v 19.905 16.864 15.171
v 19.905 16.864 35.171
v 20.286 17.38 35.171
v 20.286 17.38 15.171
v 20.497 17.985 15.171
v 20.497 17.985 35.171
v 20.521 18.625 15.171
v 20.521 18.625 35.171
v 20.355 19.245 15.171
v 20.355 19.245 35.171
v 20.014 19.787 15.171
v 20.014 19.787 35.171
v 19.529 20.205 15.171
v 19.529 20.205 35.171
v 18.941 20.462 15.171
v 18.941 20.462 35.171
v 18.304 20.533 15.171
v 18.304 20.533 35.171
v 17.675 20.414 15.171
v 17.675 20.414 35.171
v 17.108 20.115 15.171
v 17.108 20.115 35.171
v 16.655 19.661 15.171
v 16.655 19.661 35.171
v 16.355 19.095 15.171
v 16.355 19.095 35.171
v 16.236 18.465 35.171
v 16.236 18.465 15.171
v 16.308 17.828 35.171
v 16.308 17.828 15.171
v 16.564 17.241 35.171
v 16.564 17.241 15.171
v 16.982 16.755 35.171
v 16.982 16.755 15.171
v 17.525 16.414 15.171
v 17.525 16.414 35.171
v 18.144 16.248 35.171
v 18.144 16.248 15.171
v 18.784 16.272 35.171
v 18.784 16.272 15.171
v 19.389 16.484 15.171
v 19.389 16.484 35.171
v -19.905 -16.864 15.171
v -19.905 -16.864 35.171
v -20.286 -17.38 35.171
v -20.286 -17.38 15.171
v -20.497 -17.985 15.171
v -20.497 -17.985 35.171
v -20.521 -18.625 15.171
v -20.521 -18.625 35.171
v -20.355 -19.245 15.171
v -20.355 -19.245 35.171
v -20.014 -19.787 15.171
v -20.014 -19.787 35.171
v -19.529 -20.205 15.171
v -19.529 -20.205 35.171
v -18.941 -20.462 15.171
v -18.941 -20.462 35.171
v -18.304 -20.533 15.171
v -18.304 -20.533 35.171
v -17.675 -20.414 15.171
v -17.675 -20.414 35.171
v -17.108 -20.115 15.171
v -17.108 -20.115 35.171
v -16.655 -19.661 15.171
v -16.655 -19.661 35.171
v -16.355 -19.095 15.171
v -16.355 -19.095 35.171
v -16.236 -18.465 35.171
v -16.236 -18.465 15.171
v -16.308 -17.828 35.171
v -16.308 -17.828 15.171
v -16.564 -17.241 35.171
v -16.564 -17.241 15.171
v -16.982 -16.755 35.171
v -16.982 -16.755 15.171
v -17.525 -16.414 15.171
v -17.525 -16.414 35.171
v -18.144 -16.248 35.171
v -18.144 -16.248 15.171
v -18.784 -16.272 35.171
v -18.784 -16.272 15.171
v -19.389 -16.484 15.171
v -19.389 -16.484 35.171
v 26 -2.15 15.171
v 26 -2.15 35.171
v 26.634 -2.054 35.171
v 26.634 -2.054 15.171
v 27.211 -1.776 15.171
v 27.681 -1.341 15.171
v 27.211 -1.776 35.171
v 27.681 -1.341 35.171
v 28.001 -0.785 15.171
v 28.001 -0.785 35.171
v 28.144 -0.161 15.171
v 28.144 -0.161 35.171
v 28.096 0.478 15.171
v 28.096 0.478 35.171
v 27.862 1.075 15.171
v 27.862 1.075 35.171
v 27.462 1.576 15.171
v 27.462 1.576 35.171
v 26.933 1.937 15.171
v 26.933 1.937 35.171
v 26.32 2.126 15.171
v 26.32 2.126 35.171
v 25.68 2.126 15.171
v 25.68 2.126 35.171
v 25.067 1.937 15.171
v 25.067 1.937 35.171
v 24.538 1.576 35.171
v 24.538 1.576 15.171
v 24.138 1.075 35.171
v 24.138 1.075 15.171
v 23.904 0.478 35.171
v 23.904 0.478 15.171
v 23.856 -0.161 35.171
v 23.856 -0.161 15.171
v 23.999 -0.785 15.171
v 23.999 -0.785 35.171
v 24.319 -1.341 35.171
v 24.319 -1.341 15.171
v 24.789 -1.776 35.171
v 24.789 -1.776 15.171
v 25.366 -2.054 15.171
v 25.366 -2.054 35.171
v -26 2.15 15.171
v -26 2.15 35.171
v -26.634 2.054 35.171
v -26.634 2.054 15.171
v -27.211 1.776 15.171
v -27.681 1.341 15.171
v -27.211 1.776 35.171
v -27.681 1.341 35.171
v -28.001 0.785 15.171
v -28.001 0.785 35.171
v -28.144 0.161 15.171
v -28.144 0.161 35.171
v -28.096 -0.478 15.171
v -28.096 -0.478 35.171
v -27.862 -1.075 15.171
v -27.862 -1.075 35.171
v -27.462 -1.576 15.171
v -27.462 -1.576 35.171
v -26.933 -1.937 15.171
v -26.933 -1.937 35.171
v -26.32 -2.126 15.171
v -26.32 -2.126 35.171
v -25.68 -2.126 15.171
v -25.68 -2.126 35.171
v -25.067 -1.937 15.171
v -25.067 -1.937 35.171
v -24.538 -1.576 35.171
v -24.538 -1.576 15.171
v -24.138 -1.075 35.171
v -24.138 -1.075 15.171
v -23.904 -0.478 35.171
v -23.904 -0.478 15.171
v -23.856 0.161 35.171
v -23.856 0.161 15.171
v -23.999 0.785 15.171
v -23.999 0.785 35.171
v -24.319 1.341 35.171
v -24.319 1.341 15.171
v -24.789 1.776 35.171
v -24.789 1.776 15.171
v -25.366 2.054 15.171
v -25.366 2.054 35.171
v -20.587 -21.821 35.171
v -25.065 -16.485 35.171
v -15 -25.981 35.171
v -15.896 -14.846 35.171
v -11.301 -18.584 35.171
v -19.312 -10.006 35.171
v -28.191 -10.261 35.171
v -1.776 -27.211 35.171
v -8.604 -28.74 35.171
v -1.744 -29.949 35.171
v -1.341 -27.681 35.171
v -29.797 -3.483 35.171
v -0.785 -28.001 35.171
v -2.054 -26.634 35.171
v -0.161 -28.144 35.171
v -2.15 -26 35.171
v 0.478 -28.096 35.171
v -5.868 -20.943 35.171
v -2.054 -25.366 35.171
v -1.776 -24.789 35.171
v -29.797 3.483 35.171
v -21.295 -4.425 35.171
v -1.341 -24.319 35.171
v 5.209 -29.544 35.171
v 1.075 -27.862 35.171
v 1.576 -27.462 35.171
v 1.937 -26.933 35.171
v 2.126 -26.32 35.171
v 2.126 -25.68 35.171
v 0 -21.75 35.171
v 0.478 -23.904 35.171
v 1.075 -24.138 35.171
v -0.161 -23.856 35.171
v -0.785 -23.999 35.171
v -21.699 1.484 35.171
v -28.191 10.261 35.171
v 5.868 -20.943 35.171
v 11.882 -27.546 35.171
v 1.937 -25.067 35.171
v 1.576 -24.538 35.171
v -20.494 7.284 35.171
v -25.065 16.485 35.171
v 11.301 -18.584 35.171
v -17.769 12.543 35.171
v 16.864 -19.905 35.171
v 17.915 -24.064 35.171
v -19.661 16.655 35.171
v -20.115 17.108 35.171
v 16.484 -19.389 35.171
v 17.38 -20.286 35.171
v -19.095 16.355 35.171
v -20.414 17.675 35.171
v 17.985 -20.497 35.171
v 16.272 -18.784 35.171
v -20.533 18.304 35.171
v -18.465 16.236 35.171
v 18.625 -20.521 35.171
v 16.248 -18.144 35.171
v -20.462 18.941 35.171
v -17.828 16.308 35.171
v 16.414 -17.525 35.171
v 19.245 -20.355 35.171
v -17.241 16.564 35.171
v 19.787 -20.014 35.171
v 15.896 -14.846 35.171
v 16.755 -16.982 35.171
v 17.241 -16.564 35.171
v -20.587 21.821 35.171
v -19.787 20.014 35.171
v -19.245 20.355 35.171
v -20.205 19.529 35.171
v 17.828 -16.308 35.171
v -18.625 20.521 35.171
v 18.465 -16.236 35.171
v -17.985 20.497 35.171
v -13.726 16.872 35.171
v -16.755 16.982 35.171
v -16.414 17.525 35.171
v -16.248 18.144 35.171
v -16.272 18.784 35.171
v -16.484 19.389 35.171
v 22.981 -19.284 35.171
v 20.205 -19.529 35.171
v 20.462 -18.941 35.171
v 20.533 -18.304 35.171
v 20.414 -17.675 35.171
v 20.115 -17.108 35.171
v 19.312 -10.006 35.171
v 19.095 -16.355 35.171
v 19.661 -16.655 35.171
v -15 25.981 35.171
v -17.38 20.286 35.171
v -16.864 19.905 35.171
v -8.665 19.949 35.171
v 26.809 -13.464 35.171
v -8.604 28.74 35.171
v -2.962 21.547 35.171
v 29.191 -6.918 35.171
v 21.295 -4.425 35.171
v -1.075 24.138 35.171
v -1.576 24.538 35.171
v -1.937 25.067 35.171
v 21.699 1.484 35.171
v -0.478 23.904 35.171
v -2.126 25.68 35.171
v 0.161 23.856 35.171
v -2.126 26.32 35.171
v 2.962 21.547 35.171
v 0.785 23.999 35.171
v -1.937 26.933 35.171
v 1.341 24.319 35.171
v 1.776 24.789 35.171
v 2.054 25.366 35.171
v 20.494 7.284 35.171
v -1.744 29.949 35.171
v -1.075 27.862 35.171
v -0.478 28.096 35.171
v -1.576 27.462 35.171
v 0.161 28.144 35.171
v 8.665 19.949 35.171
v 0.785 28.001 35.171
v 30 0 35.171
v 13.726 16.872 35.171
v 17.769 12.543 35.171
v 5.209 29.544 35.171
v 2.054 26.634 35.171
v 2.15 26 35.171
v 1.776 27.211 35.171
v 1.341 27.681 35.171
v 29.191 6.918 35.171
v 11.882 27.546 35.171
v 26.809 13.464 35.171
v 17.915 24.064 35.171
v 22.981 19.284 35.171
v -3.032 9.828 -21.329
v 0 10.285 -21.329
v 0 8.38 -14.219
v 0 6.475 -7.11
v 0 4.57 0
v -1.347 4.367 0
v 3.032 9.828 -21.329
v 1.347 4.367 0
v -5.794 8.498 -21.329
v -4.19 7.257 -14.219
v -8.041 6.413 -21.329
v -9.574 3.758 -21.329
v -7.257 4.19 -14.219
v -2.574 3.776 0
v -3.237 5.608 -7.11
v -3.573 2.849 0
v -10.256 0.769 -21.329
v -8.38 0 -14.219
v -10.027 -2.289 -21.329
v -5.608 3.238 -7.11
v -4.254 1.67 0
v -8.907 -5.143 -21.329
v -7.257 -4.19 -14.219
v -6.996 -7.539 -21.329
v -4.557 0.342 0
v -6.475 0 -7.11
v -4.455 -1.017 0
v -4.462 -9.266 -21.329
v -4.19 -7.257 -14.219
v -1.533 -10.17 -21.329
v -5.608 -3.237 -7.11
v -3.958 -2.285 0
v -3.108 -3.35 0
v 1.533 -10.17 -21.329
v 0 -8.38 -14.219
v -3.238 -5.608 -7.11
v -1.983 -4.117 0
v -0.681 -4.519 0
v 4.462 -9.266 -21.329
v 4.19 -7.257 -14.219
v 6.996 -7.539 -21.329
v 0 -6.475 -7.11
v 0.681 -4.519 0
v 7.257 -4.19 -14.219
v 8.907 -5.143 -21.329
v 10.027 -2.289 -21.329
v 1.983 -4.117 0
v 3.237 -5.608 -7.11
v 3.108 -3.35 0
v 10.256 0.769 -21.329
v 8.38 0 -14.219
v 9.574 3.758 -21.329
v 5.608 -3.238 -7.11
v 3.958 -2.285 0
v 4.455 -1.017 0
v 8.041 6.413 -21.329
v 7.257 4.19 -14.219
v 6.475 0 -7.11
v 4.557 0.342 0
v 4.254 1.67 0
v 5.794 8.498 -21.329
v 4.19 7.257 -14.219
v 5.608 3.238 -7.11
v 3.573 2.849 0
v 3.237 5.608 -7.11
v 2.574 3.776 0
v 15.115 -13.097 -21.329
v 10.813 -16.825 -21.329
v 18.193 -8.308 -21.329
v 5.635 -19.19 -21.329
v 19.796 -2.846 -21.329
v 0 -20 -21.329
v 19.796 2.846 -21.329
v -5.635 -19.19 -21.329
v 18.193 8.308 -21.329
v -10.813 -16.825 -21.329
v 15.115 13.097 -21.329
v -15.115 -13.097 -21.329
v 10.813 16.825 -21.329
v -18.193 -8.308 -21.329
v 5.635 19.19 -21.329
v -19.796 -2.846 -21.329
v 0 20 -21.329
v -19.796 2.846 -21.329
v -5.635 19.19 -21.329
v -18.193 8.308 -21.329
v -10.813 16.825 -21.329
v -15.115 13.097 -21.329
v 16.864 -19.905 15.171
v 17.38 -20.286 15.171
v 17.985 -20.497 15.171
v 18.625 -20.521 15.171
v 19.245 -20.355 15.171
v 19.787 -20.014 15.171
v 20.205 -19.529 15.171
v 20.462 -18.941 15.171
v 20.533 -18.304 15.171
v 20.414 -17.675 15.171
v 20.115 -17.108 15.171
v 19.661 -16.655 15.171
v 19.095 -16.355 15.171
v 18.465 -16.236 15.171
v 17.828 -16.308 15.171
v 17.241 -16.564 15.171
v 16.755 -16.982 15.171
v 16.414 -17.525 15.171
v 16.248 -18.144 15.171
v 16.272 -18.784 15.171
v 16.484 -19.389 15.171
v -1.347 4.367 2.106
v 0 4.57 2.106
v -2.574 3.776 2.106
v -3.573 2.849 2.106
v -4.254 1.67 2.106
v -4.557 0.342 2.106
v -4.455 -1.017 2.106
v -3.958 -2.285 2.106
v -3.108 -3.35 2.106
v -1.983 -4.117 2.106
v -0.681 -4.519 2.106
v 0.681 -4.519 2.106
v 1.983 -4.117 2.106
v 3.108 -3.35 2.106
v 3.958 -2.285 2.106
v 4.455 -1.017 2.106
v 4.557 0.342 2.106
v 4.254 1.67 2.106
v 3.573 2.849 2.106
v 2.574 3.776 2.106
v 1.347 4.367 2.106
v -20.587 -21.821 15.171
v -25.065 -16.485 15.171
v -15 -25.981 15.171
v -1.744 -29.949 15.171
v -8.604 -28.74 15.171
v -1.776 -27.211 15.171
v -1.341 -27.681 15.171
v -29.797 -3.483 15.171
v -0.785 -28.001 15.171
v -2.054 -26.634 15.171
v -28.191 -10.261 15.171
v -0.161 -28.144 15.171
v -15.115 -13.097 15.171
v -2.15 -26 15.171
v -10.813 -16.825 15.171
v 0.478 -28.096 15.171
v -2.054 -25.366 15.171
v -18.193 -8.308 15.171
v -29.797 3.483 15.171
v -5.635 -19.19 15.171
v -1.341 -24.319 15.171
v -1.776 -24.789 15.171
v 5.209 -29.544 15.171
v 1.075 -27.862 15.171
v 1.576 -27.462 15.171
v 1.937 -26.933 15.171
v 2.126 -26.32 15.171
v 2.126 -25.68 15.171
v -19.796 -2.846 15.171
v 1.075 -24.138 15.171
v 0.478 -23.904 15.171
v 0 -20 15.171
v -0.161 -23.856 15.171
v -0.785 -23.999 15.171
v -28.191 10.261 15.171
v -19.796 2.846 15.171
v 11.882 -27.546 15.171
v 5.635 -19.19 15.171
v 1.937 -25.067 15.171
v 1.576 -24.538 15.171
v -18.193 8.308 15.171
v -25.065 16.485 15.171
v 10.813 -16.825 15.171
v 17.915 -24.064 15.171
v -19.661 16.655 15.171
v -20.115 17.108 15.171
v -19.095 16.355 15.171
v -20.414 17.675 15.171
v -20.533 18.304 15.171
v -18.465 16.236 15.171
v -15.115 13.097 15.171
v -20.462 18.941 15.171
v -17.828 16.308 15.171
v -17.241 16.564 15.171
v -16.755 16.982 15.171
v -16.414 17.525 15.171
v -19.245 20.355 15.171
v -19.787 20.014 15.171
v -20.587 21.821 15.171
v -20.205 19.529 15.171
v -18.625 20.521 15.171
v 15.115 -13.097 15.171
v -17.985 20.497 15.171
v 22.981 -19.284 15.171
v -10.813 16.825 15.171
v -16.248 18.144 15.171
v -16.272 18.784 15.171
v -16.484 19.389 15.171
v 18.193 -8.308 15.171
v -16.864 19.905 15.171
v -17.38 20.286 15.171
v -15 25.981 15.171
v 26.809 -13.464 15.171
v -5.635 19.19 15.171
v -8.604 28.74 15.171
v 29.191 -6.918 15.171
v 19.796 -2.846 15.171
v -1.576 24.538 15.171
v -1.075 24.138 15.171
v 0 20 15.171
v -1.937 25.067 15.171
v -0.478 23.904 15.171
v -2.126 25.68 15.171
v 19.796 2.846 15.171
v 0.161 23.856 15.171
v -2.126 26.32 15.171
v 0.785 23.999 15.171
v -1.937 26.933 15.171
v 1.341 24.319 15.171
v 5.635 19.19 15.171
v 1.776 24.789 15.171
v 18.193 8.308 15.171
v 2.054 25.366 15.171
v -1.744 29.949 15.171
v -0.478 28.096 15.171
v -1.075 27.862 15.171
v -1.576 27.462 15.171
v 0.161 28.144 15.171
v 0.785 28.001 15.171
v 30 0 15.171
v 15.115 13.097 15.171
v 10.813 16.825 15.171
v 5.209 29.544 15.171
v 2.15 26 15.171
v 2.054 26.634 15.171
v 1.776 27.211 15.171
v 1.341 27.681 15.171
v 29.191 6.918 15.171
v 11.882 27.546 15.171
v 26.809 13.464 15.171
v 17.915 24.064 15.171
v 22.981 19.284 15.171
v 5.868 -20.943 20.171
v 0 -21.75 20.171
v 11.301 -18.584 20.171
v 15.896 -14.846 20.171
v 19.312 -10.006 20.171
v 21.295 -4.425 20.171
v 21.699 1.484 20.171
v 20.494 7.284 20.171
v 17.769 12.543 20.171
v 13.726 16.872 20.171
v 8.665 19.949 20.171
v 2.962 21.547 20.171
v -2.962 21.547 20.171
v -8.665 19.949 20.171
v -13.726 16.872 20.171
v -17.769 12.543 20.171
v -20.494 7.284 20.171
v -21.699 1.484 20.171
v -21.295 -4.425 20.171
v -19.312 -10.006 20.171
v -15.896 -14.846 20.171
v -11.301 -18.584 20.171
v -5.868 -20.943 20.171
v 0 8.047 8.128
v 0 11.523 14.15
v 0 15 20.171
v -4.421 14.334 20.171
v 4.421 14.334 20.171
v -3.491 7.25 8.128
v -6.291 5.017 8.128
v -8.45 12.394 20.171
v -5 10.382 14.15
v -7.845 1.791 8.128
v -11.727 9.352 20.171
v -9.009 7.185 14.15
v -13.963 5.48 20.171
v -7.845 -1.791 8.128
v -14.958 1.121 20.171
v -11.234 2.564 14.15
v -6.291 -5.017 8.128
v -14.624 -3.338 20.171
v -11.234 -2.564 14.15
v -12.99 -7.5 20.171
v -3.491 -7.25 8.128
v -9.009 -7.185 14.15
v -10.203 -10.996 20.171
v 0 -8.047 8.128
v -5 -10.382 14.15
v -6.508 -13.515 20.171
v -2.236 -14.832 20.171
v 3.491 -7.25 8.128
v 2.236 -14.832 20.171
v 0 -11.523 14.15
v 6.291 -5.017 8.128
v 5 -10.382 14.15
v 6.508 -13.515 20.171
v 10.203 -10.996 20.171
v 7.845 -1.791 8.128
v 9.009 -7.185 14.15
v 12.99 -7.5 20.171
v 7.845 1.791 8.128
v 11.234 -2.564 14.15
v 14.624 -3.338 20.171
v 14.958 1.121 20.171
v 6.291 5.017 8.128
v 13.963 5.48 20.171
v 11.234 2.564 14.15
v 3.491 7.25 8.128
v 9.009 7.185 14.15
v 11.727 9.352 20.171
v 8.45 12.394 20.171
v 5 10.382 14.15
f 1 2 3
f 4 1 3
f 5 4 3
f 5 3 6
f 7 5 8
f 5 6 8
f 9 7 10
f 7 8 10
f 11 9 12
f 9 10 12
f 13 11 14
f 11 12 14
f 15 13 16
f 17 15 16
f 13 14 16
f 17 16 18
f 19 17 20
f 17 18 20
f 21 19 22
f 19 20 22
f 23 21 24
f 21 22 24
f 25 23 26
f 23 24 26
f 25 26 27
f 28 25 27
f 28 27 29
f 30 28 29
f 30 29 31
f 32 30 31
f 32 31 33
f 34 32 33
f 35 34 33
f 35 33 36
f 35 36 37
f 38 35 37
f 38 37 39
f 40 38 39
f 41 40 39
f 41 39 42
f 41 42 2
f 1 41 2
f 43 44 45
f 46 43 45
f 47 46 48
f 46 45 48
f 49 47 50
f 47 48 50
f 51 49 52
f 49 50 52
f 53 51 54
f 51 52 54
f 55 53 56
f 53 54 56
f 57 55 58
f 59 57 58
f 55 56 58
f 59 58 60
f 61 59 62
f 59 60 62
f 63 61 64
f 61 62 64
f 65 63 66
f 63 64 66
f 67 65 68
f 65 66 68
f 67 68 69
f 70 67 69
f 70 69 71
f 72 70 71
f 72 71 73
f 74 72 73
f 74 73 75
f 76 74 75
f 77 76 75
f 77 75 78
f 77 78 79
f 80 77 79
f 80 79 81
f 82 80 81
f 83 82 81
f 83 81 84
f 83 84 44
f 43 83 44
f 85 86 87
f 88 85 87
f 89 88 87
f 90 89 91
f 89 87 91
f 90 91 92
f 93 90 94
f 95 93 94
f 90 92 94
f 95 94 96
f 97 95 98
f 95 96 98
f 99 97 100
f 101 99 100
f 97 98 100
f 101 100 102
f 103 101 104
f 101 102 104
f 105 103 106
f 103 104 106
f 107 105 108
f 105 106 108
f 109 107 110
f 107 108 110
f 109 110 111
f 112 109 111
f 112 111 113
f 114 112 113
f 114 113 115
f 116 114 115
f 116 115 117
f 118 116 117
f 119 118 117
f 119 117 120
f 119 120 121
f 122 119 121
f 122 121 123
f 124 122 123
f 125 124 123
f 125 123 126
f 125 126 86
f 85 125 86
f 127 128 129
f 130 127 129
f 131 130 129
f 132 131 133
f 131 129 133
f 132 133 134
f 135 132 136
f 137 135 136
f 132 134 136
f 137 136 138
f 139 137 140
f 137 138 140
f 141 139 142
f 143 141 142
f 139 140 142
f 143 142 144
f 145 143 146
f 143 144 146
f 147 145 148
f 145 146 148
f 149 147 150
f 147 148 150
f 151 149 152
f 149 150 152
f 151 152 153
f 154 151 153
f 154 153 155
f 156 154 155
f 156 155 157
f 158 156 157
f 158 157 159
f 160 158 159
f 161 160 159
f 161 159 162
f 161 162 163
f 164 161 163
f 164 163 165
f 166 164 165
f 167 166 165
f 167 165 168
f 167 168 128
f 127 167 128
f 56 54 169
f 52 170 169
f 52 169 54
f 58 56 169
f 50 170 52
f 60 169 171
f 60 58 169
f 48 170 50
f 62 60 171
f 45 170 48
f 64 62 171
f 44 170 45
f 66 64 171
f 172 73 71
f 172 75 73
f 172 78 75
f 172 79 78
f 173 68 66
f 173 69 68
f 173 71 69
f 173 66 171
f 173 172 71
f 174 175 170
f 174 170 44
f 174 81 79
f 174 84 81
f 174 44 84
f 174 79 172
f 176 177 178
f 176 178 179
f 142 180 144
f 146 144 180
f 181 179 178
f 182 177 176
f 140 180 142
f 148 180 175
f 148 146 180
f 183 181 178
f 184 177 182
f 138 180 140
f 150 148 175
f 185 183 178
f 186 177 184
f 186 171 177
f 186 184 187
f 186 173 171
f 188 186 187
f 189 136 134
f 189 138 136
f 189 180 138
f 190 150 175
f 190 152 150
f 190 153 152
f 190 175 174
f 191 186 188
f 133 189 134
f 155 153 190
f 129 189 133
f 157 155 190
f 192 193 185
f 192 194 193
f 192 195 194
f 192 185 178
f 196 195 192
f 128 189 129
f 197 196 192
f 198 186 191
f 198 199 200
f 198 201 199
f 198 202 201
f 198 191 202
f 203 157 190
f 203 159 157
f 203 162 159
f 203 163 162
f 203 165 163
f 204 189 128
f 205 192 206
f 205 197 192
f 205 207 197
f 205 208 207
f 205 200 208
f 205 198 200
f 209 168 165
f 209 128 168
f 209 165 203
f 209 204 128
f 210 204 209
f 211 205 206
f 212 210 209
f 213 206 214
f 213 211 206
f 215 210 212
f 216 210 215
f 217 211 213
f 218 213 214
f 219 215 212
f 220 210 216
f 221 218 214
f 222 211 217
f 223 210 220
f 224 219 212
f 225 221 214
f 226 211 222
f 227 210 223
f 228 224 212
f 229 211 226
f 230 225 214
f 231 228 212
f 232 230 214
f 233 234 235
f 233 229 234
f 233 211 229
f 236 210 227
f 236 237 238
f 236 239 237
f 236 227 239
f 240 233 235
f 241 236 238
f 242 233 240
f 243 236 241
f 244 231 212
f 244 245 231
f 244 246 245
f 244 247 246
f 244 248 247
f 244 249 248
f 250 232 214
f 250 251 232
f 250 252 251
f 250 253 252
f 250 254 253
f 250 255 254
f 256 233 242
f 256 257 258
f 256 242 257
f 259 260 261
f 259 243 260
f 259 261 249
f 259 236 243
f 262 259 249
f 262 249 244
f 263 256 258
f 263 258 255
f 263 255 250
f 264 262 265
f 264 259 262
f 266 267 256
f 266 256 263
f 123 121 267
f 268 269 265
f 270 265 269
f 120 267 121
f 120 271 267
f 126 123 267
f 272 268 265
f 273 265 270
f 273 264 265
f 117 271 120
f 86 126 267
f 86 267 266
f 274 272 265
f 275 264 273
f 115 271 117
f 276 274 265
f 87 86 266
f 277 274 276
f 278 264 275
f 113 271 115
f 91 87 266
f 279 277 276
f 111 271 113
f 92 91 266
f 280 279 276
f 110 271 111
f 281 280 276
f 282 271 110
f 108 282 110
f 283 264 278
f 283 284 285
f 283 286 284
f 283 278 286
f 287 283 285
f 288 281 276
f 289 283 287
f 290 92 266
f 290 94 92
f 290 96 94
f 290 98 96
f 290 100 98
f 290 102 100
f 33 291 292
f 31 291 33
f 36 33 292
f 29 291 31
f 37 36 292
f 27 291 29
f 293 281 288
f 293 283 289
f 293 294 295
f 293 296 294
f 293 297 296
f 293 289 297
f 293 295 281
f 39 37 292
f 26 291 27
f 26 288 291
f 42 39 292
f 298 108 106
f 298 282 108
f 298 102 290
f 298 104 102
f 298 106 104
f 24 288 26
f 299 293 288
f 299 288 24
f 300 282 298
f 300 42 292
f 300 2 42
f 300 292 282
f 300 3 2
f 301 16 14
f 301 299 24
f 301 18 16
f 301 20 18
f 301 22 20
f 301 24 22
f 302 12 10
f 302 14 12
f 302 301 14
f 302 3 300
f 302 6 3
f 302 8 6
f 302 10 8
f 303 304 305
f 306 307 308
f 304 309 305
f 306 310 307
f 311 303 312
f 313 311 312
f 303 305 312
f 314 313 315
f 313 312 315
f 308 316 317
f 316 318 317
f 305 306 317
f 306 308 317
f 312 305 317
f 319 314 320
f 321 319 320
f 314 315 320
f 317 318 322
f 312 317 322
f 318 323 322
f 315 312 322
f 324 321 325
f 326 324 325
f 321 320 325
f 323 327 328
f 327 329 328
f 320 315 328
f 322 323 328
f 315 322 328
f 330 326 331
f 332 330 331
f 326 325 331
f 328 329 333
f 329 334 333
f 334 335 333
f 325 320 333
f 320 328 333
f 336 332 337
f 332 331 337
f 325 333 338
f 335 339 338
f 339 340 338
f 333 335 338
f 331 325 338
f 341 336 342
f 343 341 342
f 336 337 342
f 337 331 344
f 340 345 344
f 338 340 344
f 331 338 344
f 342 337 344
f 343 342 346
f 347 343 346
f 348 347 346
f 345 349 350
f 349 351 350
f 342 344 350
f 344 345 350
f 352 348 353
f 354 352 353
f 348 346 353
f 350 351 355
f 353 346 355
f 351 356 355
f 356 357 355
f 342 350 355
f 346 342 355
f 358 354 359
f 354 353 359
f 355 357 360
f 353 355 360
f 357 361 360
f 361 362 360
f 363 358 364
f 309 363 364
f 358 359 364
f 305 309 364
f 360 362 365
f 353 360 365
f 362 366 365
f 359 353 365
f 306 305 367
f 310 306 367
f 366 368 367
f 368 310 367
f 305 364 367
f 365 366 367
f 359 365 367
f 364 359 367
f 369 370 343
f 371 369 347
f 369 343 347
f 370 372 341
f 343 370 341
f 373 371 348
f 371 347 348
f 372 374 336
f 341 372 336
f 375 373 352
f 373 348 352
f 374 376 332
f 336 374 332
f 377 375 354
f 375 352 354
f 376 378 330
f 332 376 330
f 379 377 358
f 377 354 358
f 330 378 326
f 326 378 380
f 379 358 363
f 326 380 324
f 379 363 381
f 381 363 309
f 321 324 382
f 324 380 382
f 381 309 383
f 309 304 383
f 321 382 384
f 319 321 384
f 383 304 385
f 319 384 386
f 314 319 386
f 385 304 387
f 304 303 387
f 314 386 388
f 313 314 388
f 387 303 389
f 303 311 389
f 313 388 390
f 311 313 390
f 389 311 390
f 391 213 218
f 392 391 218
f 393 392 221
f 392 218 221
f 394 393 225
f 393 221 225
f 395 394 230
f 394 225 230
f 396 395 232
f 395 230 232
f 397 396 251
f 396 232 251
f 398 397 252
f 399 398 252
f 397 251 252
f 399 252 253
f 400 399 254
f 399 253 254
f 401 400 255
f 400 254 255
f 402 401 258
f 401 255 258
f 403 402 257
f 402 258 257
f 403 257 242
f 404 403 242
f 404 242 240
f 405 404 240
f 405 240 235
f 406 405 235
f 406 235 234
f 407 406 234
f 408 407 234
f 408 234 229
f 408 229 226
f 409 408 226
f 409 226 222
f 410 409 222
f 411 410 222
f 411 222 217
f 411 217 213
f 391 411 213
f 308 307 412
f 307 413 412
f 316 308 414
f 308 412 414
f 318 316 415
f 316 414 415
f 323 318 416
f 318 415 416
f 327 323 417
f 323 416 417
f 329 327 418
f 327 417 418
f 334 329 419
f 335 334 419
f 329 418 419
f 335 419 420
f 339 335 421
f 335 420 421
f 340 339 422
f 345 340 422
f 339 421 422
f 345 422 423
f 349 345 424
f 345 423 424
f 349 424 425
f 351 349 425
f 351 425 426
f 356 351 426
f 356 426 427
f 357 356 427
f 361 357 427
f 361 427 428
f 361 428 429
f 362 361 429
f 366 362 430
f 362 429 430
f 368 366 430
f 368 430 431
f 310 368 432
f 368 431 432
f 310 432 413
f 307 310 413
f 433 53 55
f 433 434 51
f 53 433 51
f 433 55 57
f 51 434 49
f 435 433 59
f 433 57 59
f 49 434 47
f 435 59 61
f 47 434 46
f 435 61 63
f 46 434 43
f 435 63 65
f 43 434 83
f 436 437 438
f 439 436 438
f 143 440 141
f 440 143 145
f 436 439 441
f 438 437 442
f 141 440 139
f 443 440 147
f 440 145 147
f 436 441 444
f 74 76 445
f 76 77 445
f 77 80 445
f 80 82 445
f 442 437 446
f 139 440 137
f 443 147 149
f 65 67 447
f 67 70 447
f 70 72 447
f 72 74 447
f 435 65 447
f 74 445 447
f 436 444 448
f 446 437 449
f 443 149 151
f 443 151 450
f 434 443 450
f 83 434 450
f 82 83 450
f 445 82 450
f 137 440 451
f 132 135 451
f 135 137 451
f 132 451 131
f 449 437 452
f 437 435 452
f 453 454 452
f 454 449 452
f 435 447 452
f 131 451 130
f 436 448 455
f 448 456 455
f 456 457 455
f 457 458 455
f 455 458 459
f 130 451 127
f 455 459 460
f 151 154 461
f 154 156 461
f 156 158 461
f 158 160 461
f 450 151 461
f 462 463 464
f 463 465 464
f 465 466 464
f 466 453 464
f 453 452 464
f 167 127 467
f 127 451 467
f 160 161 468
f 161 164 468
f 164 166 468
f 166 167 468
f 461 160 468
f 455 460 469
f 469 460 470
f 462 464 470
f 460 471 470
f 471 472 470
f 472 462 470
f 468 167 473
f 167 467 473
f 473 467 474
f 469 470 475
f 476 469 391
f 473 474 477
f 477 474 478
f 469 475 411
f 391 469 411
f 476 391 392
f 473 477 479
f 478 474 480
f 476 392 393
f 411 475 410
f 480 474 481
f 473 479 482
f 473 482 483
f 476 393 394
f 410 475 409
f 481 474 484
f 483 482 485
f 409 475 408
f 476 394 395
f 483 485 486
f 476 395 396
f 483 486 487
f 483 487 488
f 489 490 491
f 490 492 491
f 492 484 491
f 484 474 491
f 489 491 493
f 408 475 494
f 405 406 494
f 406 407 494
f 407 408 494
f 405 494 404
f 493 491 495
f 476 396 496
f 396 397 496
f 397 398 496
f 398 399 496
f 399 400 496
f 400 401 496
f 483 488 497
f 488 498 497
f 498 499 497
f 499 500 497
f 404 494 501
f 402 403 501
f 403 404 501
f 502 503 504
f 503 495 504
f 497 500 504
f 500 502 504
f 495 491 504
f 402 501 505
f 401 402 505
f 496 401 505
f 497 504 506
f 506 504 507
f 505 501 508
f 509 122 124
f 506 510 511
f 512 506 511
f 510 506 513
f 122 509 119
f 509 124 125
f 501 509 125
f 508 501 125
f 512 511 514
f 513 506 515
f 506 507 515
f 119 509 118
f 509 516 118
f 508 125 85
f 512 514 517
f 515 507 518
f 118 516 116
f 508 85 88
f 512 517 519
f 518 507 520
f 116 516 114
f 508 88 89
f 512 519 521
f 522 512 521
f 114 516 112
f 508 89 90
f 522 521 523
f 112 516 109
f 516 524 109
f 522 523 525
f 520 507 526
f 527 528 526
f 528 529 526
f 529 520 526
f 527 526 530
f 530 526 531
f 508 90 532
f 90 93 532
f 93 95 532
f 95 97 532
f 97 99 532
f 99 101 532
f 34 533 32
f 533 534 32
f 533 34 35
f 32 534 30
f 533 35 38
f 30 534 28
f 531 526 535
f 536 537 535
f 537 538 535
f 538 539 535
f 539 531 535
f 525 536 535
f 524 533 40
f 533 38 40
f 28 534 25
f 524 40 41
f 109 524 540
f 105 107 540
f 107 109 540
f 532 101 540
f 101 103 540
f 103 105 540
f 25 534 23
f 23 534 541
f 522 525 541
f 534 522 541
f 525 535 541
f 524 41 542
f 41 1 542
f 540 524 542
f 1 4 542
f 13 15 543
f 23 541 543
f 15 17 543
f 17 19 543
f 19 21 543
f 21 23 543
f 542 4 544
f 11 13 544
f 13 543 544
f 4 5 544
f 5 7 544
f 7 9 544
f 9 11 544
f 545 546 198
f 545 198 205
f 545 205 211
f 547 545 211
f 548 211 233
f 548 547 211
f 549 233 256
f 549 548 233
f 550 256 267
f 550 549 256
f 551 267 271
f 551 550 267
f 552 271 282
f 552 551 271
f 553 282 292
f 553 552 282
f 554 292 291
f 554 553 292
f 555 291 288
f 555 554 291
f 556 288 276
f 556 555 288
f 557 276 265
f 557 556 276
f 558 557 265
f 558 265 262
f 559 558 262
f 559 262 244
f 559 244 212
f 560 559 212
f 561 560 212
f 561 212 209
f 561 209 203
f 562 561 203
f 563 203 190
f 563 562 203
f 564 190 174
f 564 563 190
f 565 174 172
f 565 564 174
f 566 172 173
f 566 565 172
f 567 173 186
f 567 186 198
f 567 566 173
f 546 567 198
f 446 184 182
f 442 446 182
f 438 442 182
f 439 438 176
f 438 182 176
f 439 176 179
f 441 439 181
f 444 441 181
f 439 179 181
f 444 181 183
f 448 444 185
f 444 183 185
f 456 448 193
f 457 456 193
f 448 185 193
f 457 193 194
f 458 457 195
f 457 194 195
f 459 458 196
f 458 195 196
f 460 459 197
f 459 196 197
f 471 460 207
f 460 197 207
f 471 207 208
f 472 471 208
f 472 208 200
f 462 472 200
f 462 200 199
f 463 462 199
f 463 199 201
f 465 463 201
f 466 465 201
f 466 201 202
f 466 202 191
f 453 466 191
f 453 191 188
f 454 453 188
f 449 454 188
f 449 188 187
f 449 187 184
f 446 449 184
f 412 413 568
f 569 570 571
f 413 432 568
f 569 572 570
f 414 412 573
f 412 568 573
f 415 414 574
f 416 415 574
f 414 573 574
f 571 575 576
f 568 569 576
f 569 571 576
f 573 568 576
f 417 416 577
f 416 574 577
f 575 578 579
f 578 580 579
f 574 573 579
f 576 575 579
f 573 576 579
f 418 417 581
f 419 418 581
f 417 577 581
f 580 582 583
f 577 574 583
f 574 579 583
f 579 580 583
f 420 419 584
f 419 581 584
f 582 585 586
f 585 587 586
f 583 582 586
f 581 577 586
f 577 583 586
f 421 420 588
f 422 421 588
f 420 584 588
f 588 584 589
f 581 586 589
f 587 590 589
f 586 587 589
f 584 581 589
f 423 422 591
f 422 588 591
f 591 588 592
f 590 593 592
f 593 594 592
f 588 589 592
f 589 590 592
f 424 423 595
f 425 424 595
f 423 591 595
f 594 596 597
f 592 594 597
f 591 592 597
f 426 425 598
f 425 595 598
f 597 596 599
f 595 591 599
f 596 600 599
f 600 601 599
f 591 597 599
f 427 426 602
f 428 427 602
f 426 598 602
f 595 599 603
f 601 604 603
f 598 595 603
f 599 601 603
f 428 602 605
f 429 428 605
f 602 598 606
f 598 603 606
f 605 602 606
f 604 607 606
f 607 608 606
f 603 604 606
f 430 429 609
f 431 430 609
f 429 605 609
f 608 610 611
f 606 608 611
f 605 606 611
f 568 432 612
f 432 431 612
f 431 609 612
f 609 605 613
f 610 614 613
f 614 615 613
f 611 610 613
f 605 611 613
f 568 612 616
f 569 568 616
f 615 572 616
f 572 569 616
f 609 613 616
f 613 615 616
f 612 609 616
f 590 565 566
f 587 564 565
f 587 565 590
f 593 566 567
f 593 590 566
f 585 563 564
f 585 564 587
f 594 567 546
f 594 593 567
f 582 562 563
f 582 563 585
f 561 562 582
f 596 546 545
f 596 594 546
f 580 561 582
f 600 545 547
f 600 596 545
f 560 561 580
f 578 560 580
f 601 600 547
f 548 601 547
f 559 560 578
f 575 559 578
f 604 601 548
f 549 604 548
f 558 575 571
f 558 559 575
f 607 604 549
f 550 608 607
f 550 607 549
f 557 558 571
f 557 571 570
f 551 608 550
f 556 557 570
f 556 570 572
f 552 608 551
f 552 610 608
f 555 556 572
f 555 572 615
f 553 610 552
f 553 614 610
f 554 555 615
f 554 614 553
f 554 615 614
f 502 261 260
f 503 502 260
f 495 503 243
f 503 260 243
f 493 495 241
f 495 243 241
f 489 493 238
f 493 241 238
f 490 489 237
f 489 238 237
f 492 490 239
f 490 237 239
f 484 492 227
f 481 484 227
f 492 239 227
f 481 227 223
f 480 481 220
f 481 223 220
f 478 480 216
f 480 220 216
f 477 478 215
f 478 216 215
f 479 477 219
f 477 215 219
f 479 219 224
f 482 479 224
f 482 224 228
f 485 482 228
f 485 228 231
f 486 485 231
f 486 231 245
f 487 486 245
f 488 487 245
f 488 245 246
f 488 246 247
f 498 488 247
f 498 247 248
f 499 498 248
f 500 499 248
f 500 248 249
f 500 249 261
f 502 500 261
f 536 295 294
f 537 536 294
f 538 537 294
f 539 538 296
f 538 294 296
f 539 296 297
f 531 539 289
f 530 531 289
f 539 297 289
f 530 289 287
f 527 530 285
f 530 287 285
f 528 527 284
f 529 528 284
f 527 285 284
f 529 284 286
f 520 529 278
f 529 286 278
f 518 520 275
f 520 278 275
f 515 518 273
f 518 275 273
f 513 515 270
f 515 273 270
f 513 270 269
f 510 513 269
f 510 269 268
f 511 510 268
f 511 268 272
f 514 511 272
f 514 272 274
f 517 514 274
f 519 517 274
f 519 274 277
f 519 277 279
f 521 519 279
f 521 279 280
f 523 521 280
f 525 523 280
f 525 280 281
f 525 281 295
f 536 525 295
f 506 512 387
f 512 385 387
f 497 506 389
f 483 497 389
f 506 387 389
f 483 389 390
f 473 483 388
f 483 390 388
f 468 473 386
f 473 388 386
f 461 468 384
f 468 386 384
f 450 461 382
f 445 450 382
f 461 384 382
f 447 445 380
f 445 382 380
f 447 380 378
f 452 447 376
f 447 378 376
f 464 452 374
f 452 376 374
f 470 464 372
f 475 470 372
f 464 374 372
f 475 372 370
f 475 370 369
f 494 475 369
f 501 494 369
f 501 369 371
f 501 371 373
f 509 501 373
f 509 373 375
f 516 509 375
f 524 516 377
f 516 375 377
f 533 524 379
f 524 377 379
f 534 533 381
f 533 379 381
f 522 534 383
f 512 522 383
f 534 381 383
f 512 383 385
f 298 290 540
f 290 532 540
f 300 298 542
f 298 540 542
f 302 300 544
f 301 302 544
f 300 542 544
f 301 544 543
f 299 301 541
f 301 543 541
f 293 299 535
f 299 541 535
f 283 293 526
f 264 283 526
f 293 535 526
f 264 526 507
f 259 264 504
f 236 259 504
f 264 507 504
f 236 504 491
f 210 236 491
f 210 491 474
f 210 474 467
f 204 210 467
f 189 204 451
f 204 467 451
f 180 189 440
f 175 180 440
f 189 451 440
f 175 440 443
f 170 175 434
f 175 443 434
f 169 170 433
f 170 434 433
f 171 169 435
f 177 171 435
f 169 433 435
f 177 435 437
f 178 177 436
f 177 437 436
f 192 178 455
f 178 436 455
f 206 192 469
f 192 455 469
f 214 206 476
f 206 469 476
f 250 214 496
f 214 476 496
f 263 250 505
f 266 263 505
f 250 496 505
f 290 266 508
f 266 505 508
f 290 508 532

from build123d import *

# Parameters (mm, degrees)
BOSS_EXTRUDE1_START  = -5
SKETCH4_R            = 30
SKETCH4_R_2          = 20
BOSS_EXTRUDE1_DEPTH  = 5
SKETCH5_R            = 30
SKETCH5_R_2          = 21.75
BOSS_EXTRUDE2_DEPTH  = 15
M4_CLEARANCE_HOLE1_D = 4.3
CIRPATTERN1_COUNT    = 8


with BuildPart() as part:
    # Sketch2 → Revolve1 (revolve)
    with BuildSketch(Plane(origin=(0, 0, 0), x_dir=(0, 0, -1), z_dir=(1, 0, 0))):
        Polygon((21.328670365, 20), (21.328670365, 10.285), (0, 4.57), (-2.106039712, 4.57), (-20.171329635, 15), (-20.171329635, 20), align=None)
    revolve(axis=Axis((0, 0, 0), (0, 0, 1)))

    # Sketch4 → Boss-Extrude1 (add)
    with BuildSketch(Plane.XY.offset(20.171329635).offset(BOSS_EXTRUDE1_START)):
        Circle(SKETCH4_R)
        with Locations(Location((0, 0, 0), (0, 0, 90))):
            Circle(SKETCH4_R_2, mode=Mode.SUBTRACT)
    extrude(amount=BOSS_EXTRUDE1_DEPTH)

    # Sketch5 → Boss-Extrude2 (add)
    with BuildSketch(Plane.XY.offset(20.171329635)):
        Circle(SKETCH5_R)
        with Locations(Location((0, 0, 0), (0, 0, 270))):
            Circle(SKETCH5_R_2, mode=Mode.SUBTRACT)
    extrude(amount=BOSS_EXTRUDE2_DEPTH)

    # M4 Clearance Hole1 (through all)
    with Locations(Plane(origin=(0, 0, 15.171329635), x_dir=(-1, 0, 0), z_dir=(0, 0, -1))):
        with Locations((0, 26)):
            m4_clearance_hole1 = Hole(M4_CLEARANCE_HOLE1_D / 2)

    # CirPattern1: M4 Clearance Hole1 ×8 about axis
    cirpattern1_axis = Axis((0, 0, 0), (0, 0, 1))
    for i in range(1, CIRPATTERN1_COUNT):
        add(m4_clearance_hole1.rotate(cirpattern1_axis, i * 360 / CIRPATTERN1_COUNT), mode=Mode.SUBTRACT)


solid = part.part
